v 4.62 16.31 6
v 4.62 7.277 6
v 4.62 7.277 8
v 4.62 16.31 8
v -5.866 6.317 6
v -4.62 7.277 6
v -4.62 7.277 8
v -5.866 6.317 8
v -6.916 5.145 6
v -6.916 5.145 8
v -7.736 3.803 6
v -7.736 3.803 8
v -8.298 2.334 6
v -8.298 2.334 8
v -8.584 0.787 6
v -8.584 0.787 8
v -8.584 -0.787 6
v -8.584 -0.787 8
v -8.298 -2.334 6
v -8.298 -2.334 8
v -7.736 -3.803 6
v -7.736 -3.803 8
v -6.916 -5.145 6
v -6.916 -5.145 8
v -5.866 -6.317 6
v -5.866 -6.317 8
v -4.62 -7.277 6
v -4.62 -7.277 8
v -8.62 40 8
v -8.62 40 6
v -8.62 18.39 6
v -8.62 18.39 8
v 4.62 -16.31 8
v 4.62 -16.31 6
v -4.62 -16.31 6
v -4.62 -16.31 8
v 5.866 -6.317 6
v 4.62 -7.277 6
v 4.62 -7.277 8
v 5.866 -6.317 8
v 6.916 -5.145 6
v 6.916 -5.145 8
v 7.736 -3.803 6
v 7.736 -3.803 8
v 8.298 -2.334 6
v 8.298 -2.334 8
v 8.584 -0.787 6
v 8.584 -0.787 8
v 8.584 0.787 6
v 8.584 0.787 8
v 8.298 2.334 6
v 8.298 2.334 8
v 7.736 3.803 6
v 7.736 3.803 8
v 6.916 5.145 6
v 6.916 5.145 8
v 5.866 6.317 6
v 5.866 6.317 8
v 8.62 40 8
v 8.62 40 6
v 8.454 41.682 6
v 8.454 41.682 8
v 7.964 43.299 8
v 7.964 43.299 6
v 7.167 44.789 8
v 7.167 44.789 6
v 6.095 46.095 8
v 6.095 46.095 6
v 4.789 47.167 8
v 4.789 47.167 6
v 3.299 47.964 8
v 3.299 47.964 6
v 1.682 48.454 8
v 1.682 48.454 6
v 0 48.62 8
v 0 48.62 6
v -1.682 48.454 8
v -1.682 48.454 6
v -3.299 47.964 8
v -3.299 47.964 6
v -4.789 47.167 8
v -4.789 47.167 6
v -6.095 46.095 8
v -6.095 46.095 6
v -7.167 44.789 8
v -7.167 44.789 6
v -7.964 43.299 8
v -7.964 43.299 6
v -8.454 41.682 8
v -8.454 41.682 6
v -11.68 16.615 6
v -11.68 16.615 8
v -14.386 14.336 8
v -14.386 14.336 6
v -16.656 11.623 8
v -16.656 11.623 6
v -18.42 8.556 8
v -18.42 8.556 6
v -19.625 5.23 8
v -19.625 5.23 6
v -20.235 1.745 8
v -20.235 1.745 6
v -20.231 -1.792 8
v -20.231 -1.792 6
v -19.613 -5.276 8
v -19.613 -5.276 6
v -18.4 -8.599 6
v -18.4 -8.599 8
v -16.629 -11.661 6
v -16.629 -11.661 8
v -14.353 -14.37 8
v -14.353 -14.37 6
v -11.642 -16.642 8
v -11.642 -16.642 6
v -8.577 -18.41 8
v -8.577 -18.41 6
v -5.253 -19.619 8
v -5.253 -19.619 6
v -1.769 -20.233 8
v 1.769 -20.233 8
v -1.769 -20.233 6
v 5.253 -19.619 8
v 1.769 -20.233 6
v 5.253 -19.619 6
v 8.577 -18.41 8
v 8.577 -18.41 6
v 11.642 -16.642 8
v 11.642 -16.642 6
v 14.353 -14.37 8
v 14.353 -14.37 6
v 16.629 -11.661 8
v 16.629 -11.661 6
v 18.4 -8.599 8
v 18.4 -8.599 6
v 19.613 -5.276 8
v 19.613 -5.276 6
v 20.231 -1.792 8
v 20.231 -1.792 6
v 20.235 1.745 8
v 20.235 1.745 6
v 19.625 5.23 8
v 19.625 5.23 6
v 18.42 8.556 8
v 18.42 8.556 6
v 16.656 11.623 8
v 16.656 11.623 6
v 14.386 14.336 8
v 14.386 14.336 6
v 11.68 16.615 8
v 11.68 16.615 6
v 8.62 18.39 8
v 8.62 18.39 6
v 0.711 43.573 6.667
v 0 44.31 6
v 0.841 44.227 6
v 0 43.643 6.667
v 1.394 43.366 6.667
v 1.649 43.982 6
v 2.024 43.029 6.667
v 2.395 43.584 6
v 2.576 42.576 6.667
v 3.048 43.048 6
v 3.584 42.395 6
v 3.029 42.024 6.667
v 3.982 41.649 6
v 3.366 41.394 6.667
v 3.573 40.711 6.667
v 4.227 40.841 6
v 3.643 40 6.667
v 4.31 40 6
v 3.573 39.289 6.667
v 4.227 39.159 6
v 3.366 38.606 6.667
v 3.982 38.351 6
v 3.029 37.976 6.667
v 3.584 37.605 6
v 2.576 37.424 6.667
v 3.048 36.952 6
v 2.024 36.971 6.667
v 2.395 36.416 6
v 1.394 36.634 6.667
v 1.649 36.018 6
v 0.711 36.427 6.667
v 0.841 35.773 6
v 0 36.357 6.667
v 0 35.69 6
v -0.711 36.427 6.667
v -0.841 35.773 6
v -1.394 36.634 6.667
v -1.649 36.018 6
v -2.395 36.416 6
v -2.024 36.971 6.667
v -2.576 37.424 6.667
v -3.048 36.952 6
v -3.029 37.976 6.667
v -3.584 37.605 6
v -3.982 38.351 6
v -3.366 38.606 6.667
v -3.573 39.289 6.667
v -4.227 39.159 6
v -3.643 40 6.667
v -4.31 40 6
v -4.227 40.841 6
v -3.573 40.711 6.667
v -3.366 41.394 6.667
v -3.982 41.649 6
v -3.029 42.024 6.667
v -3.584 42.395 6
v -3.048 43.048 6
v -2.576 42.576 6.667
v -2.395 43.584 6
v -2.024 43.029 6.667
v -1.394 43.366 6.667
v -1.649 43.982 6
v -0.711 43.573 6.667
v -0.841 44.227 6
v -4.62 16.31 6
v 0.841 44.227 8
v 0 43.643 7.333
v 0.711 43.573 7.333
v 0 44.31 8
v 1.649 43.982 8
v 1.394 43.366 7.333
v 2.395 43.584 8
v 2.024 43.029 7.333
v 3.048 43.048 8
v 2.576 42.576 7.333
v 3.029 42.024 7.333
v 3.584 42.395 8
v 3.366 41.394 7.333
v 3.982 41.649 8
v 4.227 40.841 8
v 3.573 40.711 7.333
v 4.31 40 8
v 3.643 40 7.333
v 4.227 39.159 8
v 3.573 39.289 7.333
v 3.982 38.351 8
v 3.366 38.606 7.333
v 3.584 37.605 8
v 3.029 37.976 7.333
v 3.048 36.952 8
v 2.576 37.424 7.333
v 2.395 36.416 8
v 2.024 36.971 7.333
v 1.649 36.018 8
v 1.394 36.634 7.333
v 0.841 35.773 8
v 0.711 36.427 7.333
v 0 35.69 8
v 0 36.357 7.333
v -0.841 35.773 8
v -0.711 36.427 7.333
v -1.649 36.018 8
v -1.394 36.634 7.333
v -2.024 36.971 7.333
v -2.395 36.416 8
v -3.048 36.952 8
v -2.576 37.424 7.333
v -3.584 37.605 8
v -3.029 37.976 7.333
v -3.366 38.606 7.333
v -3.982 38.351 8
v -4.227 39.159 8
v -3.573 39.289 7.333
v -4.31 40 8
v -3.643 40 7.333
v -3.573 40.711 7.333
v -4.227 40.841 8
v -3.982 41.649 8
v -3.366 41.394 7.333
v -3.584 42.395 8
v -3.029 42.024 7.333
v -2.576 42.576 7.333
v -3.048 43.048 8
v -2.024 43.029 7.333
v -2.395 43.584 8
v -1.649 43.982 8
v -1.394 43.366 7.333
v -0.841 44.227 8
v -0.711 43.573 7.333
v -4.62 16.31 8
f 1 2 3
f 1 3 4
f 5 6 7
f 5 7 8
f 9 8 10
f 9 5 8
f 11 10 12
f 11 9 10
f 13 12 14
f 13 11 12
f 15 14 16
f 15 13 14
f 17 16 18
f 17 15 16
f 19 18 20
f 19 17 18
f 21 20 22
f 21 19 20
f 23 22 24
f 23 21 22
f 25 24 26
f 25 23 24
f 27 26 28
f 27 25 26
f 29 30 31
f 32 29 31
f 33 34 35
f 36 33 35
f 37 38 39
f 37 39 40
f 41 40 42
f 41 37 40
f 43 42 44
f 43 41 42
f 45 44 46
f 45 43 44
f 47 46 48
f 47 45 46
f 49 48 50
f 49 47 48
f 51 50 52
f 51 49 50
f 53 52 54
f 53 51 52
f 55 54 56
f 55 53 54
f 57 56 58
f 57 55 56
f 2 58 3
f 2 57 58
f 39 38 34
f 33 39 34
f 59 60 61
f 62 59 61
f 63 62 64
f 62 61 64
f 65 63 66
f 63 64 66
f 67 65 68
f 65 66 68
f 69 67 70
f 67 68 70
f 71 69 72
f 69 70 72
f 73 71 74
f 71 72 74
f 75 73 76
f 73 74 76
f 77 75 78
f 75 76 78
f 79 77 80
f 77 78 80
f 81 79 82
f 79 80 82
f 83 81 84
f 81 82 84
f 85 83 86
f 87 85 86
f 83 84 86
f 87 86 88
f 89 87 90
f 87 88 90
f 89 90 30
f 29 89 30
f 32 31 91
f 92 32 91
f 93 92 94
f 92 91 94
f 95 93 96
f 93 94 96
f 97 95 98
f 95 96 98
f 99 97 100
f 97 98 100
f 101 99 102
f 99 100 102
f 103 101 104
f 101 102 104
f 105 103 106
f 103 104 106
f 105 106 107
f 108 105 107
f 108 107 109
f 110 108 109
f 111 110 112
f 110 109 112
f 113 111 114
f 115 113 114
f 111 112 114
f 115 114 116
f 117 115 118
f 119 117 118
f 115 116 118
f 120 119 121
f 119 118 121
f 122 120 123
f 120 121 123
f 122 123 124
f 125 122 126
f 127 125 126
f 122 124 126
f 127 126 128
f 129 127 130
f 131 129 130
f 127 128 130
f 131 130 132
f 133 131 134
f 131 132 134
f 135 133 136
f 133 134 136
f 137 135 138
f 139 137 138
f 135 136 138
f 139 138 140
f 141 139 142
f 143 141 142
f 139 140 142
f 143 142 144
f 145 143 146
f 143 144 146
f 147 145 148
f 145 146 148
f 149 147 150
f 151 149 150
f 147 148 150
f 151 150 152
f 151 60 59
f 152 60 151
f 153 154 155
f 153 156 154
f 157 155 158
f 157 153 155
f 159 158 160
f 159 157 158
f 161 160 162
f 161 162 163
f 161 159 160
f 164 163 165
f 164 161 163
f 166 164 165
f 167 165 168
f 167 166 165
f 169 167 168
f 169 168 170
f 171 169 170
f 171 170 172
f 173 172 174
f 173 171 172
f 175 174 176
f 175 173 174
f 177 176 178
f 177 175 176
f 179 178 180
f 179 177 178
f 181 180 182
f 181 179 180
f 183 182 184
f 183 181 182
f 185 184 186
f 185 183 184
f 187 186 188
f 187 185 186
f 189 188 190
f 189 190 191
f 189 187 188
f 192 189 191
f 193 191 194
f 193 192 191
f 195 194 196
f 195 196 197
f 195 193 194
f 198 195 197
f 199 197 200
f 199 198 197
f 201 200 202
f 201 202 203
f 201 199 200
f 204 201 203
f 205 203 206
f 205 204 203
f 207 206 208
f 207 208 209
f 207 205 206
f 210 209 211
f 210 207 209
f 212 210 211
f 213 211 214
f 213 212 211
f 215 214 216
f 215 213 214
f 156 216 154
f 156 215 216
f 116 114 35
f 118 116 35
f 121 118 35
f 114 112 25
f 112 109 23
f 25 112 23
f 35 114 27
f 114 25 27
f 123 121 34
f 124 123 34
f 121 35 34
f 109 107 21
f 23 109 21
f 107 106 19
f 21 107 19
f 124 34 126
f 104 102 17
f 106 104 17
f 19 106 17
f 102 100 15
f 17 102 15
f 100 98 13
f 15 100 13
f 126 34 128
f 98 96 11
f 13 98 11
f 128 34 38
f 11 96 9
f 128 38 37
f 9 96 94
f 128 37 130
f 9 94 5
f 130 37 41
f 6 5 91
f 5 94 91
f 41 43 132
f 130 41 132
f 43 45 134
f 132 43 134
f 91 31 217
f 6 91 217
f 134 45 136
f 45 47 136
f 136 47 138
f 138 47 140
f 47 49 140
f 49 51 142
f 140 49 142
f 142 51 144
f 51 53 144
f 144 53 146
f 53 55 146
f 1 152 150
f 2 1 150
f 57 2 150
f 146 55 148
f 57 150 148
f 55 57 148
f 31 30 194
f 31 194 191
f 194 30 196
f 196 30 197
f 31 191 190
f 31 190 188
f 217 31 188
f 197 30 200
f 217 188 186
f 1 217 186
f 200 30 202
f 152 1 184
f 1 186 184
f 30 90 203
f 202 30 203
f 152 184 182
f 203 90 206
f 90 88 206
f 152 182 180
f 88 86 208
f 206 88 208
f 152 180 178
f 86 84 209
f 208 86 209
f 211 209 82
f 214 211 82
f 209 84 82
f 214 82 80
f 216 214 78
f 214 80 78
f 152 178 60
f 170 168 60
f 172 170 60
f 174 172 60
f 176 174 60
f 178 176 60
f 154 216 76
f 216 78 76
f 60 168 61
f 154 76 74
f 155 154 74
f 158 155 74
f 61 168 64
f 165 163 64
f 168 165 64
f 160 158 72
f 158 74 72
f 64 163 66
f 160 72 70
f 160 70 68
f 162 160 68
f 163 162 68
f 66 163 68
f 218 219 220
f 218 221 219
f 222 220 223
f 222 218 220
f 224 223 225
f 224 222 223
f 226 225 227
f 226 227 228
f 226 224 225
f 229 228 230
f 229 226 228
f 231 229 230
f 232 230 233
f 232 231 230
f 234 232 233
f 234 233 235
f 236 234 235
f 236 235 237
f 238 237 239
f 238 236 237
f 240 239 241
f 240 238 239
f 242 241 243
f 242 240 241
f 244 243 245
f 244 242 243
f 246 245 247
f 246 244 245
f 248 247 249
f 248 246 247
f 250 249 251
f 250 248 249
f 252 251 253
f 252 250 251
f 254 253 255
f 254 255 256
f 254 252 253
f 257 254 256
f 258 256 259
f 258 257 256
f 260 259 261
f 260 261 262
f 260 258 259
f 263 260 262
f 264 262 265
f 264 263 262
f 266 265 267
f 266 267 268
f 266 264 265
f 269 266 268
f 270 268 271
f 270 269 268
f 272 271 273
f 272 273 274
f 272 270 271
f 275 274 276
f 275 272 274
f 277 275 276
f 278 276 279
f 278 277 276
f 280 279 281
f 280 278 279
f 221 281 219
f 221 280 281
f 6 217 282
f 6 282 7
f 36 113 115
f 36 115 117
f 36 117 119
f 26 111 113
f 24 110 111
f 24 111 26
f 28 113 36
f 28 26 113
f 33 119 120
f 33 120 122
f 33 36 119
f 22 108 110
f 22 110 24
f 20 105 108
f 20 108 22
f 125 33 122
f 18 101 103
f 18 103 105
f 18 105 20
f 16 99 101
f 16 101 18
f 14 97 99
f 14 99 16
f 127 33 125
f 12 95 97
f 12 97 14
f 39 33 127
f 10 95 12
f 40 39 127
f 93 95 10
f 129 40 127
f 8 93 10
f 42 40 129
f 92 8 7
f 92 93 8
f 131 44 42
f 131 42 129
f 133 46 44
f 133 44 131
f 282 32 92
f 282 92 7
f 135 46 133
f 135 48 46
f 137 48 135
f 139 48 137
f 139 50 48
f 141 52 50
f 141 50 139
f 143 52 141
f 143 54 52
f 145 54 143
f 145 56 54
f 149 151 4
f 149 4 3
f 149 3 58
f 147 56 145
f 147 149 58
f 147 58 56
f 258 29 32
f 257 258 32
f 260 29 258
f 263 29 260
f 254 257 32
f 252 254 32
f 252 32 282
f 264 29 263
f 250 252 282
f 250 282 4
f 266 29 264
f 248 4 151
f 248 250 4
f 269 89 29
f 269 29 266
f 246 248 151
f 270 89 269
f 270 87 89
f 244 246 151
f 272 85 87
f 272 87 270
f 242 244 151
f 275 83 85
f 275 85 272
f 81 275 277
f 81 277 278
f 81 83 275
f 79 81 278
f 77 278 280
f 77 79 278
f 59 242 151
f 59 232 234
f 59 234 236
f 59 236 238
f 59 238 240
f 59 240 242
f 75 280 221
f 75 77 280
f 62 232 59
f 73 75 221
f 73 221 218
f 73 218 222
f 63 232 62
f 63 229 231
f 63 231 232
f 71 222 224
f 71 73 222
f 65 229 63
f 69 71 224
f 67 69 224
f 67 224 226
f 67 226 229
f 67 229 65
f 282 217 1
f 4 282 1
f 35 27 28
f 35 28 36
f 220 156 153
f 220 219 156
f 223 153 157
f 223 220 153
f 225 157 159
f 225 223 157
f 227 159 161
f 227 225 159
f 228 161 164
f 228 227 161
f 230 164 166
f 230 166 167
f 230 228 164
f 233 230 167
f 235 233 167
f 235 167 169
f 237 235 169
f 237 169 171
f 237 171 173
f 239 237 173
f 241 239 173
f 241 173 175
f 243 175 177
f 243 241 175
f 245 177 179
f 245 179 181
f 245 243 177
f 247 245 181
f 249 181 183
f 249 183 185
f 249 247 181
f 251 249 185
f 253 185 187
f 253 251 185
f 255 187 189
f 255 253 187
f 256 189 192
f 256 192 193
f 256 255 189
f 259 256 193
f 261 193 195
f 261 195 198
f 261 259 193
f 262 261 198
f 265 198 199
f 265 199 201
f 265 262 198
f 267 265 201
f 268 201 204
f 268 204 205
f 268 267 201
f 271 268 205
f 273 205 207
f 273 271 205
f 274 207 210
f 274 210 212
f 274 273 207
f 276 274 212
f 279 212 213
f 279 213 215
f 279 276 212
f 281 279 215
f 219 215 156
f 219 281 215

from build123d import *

# Parameters (mm, degrees)
EXTRUDE008_DEPTH = 2


with BuildPart() as manopla:
    # Sketch011 → Revolve (revolve)
    with BuildSketch(Plane.YZ):
        Polygon((43.6433333333, 6.6666666667), (43.6433333333, 7.3333333333), (44.31, 8), (44.31, 14), (40, 14), (40, 6), (44.31, 6), align=None)
    revolve(axis=Axis((0, 40, 6), (0, 0, -1)))


with BuildPart() as manivela001:
    # Sketch009 (on Face8 of Extrude003) → Extrude008 (new body)
    with BuildSketch(Plane.XY.offset(6)):
        with BuildLine():
            Line((-8.62, 40), (-8.62, 18.3899891245))
            ThreePointArc((-8.62, 18.3899891245), (0, -20.31), (8.62, 18.3899891245))
            Line((8.62, 40), (8.62, 18.3899891245))
            ThreePointArc((8.62, 40), (0, 48.62), (-8.62, 40))
        make_face()
        with BuildLine():
            Line((-4.62, 16.31), (4.62, 16.31))
            Line((4.62, 7.2773621595), (4.62, 16.31))
            ThreePointArc((4.62, -7.2773621595), (8.62, 0), (4.62, 7.2773621595))
            Line((4.62, -7.2773621595), (4.62, -16.31))
            Line((4.62, -16.31), (-4.62, -16.31))
            Line((-4.62, -7.2773621595), (-4.62, -16.31))
            ThreePointArc((-4.62, 7.2773621595), (-8.62, 0), (-4.62, -7.2773621595))
            Line((-4.62, 16.31), (-4.62, 7.2773621595))
        make_face(mode=Mode.SUBTRACT)
    extrude(amount=EXTRUDE008_DEPTH)

    # Cut002: cut Manopla
    add(manopla.part, mode=Mode.SUBTRACT)


solid = manivela001.part
